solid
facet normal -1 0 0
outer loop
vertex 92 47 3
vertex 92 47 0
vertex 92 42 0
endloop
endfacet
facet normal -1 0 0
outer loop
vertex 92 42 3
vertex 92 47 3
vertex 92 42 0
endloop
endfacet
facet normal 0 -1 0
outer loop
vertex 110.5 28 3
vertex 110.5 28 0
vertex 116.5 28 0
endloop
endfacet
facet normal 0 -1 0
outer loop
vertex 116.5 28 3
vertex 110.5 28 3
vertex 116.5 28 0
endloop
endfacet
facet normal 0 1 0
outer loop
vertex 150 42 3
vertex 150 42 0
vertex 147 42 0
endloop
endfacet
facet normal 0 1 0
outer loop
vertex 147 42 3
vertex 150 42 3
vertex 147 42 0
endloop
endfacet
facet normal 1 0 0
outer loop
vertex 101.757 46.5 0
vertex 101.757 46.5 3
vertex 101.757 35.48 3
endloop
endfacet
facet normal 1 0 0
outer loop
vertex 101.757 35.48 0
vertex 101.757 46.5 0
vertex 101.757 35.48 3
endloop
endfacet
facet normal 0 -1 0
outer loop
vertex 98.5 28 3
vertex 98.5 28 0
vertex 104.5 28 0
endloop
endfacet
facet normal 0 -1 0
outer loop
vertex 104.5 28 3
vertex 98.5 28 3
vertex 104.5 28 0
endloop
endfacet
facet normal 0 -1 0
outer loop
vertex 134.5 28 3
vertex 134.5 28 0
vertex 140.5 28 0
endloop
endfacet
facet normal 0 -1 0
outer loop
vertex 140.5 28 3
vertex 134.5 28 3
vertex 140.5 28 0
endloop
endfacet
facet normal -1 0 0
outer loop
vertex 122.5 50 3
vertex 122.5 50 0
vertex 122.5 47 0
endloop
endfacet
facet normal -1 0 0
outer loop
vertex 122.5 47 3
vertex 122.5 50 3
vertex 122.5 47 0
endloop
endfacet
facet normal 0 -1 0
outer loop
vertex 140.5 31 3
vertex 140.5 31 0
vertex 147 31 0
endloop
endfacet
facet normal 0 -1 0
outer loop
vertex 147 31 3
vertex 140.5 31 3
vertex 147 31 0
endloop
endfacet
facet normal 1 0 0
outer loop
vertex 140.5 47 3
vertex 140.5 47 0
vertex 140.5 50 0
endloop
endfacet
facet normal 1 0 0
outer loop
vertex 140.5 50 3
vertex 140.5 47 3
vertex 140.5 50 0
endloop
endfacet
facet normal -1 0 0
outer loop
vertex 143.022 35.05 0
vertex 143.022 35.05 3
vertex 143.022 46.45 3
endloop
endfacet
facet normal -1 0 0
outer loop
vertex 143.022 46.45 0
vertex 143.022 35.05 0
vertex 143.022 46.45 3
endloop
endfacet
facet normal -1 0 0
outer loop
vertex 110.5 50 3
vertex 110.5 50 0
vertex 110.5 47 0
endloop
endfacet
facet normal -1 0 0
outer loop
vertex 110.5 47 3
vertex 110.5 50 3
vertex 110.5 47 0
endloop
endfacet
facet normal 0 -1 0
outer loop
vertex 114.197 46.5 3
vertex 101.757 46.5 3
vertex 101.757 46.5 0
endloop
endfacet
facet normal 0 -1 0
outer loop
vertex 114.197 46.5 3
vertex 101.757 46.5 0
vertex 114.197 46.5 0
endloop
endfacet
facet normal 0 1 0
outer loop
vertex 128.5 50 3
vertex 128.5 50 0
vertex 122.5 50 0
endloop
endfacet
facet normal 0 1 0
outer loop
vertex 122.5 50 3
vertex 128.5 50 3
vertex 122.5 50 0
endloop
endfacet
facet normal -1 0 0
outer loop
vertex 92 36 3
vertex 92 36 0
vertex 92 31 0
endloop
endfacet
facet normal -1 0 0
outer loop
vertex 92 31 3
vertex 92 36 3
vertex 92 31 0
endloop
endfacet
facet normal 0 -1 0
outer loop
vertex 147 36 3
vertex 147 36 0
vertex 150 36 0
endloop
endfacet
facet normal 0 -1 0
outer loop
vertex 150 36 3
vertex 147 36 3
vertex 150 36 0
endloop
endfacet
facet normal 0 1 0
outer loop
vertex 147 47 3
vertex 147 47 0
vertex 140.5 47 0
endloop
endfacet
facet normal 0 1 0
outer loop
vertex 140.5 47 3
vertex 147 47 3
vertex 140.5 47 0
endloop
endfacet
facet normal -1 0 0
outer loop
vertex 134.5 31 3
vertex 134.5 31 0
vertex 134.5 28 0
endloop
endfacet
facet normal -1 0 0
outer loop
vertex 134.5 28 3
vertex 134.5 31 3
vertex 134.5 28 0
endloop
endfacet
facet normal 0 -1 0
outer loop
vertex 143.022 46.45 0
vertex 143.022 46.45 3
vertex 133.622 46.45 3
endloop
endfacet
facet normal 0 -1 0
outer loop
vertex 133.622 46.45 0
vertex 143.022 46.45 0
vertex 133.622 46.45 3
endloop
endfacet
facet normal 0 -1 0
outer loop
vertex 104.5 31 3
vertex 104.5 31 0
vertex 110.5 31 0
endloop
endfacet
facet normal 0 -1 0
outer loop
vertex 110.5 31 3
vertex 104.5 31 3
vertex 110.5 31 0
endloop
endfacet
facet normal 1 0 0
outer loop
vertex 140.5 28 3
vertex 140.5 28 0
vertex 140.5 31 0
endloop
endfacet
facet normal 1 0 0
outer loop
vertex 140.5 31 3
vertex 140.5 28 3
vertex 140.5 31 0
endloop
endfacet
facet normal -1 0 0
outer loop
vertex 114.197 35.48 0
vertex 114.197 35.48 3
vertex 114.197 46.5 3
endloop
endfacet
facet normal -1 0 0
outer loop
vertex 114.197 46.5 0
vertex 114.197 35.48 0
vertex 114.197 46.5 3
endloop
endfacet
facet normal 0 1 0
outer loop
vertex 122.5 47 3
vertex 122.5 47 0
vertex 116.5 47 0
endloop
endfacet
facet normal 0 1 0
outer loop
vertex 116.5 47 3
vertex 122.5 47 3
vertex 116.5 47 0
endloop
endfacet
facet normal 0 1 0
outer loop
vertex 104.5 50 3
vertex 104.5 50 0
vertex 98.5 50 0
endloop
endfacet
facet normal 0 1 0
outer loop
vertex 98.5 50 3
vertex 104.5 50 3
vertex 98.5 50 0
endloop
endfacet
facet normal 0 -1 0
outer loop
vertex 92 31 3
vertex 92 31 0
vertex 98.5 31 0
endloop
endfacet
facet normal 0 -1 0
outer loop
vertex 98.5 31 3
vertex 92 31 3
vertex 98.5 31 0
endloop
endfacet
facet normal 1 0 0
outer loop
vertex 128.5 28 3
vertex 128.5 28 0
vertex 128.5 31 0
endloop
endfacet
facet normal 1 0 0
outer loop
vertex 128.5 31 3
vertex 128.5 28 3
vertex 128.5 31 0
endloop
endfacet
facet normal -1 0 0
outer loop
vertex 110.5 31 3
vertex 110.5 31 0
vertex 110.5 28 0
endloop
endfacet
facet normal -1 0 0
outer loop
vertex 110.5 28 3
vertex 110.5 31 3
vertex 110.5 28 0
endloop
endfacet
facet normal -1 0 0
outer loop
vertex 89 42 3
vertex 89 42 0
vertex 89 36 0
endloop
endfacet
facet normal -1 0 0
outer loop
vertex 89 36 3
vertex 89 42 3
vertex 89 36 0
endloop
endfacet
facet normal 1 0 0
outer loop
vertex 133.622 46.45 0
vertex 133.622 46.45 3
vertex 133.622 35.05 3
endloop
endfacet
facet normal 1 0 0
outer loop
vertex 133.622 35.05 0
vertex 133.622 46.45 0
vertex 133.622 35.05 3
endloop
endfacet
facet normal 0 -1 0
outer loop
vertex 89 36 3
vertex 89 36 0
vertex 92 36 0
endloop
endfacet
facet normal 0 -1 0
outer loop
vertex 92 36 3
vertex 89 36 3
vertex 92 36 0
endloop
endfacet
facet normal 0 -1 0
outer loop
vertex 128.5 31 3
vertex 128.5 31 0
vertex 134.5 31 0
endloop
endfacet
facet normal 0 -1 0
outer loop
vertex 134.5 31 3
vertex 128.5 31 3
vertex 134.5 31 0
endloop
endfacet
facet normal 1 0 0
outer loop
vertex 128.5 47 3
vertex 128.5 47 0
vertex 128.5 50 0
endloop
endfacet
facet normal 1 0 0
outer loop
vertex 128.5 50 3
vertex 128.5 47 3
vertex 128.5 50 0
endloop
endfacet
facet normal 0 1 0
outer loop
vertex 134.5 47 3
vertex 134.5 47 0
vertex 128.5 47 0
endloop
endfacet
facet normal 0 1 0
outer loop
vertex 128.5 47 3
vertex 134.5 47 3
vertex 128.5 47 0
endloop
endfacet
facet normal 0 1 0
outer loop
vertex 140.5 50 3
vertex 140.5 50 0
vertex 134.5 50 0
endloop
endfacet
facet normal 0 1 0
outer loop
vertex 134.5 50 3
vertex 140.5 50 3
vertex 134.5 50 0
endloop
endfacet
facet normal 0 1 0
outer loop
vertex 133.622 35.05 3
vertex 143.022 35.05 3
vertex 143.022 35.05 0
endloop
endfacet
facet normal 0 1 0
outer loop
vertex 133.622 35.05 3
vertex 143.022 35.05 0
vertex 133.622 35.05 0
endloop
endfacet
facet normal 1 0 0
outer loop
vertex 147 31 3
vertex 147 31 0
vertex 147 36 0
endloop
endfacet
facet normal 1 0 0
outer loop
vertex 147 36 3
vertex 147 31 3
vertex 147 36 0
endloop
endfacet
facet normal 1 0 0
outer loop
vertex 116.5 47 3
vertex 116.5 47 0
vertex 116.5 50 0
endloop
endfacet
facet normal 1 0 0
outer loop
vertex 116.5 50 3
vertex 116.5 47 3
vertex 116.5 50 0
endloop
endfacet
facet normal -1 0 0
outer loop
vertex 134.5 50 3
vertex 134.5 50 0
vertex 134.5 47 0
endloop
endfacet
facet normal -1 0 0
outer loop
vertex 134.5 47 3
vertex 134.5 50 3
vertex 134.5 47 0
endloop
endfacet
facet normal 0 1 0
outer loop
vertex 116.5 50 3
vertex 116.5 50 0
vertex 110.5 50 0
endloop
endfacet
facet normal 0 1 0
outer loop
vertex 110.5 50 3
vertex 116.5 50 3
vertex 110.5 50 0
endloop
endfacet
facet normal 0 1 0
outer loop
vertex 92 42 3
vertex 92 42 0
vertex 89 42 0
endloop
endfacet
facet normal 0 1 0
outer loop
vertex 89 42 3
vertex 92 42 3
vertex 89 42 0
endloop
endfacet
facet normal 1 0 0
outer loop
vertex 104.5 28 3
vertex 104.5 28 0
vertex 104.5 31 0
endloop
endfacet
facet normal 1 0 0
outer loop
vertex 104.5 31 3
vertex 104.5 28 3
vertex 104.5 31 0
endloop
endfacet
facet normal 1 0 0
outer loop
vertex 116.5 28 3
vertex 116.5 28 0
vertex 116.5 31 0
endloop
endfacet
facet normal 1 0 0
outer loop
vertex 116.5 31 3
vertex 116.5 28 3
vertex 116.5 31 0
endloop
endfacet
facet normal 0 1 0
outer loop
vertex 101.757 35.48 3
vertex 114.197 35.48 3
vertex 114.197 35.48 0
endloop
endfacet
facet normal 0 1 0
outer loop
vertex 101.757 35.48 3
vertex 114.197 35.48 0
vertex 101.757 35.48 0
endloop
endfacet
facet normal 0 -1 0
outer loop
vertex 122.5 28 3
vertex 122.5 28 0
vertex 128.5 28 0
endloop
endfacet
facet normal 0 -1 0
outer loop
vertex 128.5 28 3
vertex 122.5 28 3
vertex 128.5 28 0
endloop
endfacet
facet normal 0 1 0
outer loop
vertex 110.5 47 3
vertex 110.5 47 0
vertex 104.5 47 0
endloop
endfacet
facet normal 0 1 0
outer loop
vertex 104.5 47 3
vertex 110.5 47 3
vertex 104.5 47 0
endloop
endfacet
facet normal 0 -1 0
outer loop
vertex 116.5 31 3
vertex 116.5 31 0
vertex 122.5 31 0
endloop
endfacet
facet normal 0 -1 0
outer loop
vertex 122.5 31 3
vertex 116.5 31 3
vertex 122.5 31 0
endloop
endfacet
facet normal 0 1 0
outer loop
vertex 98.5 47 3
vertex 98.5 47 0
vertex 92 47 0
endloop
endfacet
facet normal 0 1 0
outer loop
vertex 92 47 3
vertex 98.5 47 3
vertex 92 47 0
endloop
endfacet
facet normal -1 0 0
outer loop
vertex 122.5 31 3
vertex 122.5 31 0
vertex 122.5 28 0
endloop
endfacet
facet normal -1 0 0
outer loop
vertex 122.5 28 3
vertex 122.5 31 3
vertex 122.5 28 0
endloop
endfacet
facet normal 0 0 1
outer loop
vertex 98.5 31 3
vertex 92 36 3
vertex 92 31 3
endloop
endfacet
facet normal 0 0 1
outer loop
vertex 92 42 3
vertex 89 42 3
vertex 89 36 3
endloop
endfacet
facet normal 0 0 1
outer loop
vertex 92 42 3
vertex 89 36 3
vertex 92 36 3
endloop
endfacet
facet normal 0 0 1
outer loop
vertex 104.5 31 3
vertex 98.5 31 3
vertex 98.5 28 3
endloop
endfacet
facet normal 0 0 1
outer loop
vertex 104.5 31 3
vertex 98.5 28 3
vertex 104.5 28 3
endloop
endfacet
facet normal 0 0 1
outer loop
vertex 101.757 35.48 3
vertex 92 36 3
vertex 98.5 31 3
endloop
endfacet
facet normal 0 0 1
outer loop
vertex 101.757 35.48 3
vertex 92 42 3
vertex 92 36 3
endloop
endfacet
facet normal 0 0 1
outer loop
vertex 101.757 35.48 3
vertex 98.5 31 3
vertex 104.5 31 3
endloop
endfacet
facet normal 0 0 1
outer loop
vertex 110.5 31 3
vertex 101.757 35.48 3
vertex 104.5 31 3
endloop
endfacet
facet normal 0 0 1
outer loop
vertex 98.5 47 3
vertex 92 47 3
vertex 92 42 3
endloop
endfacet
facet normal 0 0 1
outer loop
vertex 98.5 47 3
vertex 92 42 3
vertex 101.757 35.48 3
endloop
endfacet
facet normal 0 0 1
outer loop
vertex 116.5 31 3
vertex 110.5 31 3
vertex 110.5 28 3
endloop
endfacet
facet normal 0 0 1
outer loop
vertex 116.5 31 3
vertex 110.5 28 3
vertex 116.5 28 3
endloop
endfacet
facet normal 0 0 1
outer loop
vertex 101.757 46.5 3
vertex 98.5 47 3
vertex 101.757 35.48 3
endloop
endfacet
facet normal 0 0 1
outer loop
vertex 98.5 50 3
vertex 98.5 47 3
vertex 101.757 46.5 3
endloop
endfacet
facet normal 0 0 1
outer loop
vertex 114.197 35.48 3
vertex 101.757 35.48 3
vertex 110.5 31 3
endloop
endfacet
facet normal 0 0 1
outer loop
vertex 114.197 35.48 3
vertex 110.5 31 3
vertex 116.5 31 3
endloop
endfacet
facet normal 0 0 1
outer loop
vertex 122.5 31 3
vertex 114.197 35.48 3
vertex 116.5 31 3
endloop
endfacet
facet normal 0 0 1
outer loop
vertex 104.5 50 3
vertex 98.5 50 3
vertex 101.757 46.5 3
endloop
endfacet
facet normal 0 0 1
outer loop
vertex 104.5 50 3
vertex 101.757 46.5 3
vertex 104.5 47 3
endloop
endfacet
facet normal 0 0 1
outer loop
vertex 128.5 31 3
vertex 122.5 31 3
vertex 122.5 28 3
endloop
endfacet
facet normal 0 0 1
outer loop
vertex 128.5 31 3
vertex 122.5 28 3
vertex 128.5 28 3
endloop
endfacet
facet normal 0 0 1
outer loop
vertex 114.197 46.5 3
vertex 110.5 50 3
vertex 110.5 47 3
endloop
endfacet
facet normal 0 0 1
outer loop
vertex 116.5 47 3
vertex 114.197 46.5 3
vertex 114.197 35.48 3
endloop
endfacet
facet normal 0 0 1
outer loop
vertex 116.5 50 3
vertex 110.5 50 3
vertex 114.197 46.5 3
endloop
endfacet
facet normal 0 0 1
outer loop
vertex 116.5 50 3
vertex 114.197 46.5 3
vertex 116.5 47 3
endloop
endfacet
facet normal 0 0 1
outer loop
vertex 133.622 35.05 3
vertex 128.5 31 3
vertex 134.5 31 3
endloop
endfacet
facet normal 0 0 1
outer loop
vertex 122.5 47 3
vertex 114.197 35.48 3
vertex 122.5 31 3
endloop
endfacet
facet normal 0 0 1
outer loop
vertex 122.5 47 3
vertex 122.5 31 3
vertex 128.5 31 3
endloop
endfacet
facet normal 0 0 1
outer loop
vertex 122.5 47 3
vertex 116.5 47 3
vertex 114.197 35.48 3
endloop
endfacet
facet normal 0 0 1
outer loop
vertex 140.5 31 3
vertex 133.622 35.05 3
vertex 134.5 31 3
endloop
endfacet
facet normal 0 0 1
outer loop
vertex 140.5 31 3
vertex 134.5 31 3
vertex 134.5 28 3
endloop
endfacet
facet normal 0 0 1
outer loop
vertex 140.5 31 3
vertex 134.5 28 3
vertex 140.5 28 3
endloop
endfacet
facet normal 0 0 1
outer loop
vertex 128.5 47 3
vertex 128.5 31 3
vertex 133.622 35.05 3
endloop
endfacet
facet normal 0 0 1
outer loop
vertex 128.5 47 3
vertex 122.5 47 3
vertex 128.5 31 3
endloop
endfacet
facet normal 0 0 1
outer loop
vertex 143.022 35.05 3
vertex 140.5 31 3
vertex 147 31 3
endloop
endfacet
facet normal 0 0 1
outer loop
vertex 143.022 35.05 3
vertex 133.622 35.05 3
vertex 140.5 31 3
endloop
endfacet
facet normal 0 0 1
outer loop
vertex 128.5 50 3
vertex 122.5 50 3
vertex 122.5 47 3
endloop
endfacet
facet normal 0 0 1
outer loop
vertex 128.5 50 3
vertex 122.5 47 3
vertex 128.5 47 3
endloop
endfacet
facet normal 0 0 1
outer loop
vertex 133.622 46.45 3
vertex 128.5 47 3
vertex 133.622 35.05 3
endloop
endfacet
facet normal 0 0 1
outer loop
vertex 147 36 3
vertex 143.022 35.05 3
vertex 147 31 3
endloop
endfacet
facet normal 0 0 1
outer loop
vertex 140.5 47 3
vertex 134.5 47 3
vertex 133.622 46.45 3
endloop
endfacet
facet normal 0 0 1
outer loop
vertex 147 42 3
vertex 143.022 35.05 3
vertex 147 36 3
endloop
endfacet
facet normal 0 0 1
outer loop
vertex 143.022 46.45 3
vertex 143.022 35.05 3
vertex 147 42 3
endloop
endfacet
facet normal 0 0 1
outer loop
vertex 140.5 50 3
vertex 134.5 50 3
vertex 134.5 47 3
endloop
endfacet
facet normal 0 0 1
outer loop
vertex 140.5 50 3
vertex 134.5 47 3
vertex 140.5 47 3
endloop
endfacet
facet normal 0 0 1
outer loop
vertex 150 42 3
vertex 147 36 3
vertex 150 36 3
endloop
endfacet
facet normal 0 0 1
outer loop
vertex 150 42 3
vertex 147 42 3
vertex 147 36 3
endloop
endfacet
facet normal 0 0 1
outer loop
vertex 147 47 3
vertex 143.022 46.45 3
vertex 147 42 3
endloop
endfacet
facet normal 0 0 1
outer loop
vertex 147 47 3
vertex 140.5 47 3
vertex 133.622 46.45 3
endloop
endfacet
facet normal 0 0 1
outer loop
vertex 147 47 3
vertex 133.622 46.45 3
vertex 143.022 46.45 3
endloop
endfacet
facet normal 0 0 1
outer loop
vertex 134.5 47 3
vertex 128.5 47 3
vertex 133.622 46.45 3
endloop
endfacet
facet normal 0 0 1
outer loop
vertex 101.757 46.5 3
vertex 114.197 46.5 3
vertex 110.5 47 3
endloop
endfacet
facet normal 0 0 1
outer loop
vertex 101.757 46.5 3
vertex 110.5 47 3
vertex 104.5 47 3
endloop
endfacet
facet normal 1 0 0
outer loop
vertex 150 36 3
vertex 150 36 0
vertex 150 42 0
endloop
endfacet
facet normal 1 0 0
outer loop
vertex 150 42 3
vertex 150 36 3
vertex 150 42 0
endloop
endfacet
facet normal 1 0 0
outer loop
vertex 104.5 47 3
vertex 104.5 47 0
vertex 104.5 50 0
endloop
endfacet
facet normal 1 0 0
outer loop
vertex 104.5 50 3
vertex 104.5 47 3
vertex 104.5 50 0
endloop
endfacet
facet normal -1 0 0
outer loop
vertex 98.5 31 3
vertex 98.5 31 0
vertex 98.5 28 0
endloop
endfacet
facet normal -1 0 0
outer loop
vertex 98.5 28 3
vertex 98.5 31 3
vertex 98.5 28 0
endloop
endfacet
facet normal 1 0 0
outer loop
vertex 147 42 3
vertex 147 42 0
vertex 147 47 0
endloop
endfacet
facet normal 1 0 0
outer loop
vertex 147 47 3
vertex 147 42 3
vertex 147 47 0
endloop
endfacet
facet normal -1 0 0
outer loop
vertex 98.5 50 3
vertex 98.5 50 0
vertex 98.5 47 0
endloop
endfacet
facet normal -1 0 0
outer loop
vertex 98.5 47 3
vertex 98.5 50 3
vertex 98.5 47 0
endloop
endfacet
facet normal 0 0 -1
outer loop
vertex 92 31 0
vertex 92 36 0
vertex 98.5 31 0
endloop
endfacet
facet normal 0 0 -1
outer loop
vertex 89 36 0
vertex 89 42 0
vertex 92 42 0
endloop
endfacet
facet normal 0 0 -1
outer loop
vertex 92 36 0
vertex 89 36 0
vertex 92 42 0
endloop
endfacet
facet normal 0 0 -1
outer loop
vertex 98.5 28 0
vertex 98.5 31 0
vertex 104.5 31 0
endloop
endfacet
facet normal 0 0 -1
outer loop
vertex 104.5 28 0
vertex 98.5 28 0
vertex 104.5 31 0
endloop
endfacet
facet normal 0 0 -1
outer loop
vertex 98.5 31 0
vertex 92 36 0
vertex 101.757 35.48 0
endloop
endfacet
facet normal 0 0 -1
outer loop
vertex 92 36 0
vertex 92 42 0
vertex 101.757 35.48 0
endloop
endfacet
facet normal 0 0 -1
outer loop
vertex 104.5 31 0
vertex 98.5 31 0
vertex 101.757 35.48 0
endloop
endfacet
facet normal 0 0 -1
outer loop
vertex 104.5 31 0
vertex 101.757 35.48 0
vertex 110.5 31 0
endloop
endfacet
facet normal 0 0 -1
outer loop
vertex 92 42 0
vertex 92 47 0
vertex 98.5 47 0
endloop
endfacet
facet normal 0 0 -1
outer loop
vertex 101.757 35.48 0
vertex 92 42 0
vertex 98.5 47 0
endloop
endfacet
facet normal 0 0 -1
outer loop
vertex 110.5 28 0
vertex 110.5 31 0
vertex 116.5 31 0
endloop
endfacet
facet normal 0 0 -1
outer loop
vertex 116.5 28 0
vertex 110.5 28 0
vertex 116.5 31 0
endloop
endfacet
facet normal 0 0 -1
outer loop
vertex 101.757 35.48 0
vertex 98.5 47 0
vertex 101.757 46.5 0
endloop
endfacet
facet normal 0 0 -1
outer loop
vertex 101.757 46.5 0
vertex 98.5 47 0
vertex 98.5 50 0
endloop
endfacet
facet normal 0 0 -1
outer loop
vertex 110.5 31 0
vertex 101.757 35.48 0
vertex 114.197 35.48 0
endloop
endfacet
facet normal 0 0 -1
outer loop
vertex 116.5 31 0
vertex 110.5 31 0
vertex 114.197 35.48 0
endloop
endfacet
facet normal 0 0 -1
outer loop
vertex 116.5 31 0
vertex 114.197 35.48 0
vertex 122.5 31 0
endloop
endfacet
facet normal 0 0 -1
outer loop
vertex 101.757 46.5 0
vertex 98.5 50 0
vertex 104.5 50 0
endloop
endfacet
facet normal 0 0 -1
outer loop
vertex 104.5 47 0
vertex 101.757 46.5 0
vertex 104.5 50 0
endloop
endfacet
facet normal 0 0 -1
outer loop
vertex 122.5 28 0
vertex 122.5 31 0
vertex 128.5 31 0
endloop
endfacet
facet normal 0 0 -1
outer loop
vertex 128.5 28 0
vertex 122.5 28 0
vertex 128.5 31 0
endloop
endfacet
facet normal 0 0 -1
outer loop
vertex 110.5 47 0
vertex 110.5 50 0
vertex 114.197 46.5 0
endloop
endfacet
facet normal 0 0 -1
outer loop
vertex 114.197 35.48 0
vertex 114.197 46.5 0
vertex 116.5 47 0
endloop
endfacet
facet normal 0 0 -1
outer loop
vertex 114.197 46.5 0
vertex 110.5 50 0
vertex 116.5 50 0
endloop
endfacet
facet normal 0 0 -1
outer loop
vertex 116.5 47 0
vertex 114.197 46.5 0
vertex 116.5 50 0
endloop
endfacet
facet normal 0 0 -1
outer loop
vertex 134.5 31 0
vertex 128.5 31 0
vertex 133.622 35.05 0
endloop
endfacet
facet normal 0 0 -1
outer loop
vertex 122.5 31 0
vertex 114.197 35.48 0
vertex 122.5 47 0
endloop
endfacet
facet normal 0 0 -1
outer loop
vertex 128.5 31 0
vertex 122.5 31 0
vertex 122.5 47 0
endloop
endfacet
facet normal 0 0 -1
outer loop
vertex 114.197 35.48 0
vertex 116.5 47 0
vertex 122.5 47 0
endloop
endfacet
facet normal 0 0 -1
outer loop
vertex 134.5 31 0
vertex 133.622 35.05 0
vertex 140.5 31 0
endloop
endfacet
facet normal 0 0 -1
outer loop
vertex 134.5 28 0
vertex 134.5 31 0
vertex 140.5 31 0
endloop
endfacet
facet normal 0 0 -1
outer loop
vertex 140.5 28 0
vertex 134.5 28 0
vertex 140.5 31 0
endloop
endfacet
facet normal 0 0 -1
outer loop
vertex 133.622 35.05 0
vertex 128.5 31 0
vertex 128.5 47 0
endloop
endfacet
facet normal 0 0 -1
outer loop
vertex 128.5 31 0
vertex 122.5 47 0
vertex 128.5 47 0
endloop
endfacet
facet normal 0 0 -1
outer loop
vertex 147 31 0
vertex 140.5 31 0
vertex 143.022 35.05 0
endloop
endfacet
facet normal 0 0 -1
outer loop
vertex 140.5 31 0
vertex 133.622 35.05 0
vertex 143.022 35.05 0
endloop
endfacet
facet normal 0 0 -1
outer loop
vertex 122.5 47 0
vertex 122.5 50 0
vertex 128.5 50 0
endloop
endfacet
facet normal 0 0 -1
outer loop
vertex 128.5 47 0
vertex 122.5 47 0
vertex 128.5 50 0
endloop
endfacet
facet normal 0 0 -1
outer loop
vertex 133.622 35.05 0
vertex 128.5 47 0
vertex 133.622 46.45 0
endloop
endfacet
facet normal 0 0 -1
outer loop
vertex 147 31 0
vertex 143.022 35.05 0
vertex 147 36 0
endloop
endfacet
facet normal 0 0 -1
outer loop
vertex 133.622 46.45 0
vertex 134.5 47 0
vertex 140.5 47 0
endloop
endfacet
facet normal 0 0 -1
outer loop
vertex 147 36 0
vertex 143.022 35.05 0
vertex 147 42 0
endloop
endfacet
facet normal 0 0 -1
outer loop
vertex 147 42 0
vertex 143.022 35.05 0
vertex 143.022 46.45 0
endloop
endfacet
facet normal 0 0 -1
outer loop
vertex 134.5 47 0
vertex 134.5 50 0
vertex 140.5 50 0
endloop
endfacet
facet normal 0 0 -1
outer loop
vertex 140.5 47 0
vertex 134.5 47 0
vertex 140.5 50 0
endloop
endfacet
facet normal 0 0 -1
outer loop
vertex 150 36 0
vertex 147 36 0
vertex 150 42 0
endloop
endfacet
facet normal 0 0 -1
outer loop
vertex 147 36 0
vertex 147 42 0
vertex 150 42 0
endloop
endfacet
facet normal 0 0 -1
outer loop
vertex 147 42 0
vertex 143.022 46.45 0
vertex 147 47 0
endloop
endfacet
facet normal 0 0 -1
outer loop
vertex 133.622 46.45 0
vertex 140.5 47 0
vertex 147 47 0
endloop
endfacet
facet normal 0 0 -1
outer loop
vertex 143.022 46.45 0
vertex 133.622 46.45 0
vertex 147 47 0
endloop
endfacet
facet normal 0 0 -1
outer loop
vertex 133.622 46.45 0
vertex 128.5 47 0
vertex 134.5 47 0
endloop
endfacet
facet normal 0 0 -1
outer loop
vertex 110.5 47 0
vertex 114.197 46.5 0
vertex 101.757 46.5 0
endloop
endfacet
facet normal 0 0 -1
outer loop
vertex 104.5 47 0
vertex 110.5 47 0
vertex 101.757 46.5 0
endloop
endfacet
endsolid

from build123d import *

# Parameters (mm, degrees)
EXTRUDE_1_DEPTH     = 3
CUT_EXTRUDE_1_DEPTH = 159.142340946


with BuildPart() as part:
    # Model → 凸台-拉伸1 (new body)
    with BuildSketch(Plane.XY):
        Polygon((92, 47), (92, 42), (89, 42), (89, 36), (92, 36), (92, 31), (98.5, 31), (98.5, 28), (104.5, 28), (104.5, 31), (110.5, 31), (110.5, 28), (116.5, 28), (116.5, 31), (122.5, 31), (122.5, 28), (128.5, 28), (128.5, 31), (134.5, 31), (134.5, 28), (140.5, 28), (140.5, 31), (146.5, 31), (147, 31), (147, 36), (150, 36), (150, 42), (147, 42), (147, 47), (140.5, 47), (140.5, 50), (134.5, 50), (134.5, 47), (128.5, 47), (128.5, 50), (122.5, 50), (122.5, 47), (116.5, 47), (116.5, 50), (110.5, 50), (110.5, 47), (104.5, 47), (104.5, 50), (98.5, 50), (98.5, 47), (92.5, 47), align=None)
    extrude(amount=EXTRUDE_1_DEPTH)

    # 草图2 → 切除-拉伸1 (cut, through all)
    with BuildSketch(Plane.XY.offset(3)):
        Polygon((133.622004458, 45.75), (133.622004458, 46.45), (134.322004458, 46.45), (142.322004458, 46.45), (143.022004458, 46.45), (143.022004458, 45.75), (143.022004458, 35.05), (133.622004458, 35.05), align=None)
        Polygon((114.197004458, 35.48), (101.757004458, 35.48), (101.757004458, 45.74), (101.757004458, 46.5), (114.197004458, 46.5), (114.197004458, 45.74), align=None)
    extrude(amount=-CUT_EXTRUDE_1_DEPTH, mode=Mode.SUBTRACT)


solid = part.part
